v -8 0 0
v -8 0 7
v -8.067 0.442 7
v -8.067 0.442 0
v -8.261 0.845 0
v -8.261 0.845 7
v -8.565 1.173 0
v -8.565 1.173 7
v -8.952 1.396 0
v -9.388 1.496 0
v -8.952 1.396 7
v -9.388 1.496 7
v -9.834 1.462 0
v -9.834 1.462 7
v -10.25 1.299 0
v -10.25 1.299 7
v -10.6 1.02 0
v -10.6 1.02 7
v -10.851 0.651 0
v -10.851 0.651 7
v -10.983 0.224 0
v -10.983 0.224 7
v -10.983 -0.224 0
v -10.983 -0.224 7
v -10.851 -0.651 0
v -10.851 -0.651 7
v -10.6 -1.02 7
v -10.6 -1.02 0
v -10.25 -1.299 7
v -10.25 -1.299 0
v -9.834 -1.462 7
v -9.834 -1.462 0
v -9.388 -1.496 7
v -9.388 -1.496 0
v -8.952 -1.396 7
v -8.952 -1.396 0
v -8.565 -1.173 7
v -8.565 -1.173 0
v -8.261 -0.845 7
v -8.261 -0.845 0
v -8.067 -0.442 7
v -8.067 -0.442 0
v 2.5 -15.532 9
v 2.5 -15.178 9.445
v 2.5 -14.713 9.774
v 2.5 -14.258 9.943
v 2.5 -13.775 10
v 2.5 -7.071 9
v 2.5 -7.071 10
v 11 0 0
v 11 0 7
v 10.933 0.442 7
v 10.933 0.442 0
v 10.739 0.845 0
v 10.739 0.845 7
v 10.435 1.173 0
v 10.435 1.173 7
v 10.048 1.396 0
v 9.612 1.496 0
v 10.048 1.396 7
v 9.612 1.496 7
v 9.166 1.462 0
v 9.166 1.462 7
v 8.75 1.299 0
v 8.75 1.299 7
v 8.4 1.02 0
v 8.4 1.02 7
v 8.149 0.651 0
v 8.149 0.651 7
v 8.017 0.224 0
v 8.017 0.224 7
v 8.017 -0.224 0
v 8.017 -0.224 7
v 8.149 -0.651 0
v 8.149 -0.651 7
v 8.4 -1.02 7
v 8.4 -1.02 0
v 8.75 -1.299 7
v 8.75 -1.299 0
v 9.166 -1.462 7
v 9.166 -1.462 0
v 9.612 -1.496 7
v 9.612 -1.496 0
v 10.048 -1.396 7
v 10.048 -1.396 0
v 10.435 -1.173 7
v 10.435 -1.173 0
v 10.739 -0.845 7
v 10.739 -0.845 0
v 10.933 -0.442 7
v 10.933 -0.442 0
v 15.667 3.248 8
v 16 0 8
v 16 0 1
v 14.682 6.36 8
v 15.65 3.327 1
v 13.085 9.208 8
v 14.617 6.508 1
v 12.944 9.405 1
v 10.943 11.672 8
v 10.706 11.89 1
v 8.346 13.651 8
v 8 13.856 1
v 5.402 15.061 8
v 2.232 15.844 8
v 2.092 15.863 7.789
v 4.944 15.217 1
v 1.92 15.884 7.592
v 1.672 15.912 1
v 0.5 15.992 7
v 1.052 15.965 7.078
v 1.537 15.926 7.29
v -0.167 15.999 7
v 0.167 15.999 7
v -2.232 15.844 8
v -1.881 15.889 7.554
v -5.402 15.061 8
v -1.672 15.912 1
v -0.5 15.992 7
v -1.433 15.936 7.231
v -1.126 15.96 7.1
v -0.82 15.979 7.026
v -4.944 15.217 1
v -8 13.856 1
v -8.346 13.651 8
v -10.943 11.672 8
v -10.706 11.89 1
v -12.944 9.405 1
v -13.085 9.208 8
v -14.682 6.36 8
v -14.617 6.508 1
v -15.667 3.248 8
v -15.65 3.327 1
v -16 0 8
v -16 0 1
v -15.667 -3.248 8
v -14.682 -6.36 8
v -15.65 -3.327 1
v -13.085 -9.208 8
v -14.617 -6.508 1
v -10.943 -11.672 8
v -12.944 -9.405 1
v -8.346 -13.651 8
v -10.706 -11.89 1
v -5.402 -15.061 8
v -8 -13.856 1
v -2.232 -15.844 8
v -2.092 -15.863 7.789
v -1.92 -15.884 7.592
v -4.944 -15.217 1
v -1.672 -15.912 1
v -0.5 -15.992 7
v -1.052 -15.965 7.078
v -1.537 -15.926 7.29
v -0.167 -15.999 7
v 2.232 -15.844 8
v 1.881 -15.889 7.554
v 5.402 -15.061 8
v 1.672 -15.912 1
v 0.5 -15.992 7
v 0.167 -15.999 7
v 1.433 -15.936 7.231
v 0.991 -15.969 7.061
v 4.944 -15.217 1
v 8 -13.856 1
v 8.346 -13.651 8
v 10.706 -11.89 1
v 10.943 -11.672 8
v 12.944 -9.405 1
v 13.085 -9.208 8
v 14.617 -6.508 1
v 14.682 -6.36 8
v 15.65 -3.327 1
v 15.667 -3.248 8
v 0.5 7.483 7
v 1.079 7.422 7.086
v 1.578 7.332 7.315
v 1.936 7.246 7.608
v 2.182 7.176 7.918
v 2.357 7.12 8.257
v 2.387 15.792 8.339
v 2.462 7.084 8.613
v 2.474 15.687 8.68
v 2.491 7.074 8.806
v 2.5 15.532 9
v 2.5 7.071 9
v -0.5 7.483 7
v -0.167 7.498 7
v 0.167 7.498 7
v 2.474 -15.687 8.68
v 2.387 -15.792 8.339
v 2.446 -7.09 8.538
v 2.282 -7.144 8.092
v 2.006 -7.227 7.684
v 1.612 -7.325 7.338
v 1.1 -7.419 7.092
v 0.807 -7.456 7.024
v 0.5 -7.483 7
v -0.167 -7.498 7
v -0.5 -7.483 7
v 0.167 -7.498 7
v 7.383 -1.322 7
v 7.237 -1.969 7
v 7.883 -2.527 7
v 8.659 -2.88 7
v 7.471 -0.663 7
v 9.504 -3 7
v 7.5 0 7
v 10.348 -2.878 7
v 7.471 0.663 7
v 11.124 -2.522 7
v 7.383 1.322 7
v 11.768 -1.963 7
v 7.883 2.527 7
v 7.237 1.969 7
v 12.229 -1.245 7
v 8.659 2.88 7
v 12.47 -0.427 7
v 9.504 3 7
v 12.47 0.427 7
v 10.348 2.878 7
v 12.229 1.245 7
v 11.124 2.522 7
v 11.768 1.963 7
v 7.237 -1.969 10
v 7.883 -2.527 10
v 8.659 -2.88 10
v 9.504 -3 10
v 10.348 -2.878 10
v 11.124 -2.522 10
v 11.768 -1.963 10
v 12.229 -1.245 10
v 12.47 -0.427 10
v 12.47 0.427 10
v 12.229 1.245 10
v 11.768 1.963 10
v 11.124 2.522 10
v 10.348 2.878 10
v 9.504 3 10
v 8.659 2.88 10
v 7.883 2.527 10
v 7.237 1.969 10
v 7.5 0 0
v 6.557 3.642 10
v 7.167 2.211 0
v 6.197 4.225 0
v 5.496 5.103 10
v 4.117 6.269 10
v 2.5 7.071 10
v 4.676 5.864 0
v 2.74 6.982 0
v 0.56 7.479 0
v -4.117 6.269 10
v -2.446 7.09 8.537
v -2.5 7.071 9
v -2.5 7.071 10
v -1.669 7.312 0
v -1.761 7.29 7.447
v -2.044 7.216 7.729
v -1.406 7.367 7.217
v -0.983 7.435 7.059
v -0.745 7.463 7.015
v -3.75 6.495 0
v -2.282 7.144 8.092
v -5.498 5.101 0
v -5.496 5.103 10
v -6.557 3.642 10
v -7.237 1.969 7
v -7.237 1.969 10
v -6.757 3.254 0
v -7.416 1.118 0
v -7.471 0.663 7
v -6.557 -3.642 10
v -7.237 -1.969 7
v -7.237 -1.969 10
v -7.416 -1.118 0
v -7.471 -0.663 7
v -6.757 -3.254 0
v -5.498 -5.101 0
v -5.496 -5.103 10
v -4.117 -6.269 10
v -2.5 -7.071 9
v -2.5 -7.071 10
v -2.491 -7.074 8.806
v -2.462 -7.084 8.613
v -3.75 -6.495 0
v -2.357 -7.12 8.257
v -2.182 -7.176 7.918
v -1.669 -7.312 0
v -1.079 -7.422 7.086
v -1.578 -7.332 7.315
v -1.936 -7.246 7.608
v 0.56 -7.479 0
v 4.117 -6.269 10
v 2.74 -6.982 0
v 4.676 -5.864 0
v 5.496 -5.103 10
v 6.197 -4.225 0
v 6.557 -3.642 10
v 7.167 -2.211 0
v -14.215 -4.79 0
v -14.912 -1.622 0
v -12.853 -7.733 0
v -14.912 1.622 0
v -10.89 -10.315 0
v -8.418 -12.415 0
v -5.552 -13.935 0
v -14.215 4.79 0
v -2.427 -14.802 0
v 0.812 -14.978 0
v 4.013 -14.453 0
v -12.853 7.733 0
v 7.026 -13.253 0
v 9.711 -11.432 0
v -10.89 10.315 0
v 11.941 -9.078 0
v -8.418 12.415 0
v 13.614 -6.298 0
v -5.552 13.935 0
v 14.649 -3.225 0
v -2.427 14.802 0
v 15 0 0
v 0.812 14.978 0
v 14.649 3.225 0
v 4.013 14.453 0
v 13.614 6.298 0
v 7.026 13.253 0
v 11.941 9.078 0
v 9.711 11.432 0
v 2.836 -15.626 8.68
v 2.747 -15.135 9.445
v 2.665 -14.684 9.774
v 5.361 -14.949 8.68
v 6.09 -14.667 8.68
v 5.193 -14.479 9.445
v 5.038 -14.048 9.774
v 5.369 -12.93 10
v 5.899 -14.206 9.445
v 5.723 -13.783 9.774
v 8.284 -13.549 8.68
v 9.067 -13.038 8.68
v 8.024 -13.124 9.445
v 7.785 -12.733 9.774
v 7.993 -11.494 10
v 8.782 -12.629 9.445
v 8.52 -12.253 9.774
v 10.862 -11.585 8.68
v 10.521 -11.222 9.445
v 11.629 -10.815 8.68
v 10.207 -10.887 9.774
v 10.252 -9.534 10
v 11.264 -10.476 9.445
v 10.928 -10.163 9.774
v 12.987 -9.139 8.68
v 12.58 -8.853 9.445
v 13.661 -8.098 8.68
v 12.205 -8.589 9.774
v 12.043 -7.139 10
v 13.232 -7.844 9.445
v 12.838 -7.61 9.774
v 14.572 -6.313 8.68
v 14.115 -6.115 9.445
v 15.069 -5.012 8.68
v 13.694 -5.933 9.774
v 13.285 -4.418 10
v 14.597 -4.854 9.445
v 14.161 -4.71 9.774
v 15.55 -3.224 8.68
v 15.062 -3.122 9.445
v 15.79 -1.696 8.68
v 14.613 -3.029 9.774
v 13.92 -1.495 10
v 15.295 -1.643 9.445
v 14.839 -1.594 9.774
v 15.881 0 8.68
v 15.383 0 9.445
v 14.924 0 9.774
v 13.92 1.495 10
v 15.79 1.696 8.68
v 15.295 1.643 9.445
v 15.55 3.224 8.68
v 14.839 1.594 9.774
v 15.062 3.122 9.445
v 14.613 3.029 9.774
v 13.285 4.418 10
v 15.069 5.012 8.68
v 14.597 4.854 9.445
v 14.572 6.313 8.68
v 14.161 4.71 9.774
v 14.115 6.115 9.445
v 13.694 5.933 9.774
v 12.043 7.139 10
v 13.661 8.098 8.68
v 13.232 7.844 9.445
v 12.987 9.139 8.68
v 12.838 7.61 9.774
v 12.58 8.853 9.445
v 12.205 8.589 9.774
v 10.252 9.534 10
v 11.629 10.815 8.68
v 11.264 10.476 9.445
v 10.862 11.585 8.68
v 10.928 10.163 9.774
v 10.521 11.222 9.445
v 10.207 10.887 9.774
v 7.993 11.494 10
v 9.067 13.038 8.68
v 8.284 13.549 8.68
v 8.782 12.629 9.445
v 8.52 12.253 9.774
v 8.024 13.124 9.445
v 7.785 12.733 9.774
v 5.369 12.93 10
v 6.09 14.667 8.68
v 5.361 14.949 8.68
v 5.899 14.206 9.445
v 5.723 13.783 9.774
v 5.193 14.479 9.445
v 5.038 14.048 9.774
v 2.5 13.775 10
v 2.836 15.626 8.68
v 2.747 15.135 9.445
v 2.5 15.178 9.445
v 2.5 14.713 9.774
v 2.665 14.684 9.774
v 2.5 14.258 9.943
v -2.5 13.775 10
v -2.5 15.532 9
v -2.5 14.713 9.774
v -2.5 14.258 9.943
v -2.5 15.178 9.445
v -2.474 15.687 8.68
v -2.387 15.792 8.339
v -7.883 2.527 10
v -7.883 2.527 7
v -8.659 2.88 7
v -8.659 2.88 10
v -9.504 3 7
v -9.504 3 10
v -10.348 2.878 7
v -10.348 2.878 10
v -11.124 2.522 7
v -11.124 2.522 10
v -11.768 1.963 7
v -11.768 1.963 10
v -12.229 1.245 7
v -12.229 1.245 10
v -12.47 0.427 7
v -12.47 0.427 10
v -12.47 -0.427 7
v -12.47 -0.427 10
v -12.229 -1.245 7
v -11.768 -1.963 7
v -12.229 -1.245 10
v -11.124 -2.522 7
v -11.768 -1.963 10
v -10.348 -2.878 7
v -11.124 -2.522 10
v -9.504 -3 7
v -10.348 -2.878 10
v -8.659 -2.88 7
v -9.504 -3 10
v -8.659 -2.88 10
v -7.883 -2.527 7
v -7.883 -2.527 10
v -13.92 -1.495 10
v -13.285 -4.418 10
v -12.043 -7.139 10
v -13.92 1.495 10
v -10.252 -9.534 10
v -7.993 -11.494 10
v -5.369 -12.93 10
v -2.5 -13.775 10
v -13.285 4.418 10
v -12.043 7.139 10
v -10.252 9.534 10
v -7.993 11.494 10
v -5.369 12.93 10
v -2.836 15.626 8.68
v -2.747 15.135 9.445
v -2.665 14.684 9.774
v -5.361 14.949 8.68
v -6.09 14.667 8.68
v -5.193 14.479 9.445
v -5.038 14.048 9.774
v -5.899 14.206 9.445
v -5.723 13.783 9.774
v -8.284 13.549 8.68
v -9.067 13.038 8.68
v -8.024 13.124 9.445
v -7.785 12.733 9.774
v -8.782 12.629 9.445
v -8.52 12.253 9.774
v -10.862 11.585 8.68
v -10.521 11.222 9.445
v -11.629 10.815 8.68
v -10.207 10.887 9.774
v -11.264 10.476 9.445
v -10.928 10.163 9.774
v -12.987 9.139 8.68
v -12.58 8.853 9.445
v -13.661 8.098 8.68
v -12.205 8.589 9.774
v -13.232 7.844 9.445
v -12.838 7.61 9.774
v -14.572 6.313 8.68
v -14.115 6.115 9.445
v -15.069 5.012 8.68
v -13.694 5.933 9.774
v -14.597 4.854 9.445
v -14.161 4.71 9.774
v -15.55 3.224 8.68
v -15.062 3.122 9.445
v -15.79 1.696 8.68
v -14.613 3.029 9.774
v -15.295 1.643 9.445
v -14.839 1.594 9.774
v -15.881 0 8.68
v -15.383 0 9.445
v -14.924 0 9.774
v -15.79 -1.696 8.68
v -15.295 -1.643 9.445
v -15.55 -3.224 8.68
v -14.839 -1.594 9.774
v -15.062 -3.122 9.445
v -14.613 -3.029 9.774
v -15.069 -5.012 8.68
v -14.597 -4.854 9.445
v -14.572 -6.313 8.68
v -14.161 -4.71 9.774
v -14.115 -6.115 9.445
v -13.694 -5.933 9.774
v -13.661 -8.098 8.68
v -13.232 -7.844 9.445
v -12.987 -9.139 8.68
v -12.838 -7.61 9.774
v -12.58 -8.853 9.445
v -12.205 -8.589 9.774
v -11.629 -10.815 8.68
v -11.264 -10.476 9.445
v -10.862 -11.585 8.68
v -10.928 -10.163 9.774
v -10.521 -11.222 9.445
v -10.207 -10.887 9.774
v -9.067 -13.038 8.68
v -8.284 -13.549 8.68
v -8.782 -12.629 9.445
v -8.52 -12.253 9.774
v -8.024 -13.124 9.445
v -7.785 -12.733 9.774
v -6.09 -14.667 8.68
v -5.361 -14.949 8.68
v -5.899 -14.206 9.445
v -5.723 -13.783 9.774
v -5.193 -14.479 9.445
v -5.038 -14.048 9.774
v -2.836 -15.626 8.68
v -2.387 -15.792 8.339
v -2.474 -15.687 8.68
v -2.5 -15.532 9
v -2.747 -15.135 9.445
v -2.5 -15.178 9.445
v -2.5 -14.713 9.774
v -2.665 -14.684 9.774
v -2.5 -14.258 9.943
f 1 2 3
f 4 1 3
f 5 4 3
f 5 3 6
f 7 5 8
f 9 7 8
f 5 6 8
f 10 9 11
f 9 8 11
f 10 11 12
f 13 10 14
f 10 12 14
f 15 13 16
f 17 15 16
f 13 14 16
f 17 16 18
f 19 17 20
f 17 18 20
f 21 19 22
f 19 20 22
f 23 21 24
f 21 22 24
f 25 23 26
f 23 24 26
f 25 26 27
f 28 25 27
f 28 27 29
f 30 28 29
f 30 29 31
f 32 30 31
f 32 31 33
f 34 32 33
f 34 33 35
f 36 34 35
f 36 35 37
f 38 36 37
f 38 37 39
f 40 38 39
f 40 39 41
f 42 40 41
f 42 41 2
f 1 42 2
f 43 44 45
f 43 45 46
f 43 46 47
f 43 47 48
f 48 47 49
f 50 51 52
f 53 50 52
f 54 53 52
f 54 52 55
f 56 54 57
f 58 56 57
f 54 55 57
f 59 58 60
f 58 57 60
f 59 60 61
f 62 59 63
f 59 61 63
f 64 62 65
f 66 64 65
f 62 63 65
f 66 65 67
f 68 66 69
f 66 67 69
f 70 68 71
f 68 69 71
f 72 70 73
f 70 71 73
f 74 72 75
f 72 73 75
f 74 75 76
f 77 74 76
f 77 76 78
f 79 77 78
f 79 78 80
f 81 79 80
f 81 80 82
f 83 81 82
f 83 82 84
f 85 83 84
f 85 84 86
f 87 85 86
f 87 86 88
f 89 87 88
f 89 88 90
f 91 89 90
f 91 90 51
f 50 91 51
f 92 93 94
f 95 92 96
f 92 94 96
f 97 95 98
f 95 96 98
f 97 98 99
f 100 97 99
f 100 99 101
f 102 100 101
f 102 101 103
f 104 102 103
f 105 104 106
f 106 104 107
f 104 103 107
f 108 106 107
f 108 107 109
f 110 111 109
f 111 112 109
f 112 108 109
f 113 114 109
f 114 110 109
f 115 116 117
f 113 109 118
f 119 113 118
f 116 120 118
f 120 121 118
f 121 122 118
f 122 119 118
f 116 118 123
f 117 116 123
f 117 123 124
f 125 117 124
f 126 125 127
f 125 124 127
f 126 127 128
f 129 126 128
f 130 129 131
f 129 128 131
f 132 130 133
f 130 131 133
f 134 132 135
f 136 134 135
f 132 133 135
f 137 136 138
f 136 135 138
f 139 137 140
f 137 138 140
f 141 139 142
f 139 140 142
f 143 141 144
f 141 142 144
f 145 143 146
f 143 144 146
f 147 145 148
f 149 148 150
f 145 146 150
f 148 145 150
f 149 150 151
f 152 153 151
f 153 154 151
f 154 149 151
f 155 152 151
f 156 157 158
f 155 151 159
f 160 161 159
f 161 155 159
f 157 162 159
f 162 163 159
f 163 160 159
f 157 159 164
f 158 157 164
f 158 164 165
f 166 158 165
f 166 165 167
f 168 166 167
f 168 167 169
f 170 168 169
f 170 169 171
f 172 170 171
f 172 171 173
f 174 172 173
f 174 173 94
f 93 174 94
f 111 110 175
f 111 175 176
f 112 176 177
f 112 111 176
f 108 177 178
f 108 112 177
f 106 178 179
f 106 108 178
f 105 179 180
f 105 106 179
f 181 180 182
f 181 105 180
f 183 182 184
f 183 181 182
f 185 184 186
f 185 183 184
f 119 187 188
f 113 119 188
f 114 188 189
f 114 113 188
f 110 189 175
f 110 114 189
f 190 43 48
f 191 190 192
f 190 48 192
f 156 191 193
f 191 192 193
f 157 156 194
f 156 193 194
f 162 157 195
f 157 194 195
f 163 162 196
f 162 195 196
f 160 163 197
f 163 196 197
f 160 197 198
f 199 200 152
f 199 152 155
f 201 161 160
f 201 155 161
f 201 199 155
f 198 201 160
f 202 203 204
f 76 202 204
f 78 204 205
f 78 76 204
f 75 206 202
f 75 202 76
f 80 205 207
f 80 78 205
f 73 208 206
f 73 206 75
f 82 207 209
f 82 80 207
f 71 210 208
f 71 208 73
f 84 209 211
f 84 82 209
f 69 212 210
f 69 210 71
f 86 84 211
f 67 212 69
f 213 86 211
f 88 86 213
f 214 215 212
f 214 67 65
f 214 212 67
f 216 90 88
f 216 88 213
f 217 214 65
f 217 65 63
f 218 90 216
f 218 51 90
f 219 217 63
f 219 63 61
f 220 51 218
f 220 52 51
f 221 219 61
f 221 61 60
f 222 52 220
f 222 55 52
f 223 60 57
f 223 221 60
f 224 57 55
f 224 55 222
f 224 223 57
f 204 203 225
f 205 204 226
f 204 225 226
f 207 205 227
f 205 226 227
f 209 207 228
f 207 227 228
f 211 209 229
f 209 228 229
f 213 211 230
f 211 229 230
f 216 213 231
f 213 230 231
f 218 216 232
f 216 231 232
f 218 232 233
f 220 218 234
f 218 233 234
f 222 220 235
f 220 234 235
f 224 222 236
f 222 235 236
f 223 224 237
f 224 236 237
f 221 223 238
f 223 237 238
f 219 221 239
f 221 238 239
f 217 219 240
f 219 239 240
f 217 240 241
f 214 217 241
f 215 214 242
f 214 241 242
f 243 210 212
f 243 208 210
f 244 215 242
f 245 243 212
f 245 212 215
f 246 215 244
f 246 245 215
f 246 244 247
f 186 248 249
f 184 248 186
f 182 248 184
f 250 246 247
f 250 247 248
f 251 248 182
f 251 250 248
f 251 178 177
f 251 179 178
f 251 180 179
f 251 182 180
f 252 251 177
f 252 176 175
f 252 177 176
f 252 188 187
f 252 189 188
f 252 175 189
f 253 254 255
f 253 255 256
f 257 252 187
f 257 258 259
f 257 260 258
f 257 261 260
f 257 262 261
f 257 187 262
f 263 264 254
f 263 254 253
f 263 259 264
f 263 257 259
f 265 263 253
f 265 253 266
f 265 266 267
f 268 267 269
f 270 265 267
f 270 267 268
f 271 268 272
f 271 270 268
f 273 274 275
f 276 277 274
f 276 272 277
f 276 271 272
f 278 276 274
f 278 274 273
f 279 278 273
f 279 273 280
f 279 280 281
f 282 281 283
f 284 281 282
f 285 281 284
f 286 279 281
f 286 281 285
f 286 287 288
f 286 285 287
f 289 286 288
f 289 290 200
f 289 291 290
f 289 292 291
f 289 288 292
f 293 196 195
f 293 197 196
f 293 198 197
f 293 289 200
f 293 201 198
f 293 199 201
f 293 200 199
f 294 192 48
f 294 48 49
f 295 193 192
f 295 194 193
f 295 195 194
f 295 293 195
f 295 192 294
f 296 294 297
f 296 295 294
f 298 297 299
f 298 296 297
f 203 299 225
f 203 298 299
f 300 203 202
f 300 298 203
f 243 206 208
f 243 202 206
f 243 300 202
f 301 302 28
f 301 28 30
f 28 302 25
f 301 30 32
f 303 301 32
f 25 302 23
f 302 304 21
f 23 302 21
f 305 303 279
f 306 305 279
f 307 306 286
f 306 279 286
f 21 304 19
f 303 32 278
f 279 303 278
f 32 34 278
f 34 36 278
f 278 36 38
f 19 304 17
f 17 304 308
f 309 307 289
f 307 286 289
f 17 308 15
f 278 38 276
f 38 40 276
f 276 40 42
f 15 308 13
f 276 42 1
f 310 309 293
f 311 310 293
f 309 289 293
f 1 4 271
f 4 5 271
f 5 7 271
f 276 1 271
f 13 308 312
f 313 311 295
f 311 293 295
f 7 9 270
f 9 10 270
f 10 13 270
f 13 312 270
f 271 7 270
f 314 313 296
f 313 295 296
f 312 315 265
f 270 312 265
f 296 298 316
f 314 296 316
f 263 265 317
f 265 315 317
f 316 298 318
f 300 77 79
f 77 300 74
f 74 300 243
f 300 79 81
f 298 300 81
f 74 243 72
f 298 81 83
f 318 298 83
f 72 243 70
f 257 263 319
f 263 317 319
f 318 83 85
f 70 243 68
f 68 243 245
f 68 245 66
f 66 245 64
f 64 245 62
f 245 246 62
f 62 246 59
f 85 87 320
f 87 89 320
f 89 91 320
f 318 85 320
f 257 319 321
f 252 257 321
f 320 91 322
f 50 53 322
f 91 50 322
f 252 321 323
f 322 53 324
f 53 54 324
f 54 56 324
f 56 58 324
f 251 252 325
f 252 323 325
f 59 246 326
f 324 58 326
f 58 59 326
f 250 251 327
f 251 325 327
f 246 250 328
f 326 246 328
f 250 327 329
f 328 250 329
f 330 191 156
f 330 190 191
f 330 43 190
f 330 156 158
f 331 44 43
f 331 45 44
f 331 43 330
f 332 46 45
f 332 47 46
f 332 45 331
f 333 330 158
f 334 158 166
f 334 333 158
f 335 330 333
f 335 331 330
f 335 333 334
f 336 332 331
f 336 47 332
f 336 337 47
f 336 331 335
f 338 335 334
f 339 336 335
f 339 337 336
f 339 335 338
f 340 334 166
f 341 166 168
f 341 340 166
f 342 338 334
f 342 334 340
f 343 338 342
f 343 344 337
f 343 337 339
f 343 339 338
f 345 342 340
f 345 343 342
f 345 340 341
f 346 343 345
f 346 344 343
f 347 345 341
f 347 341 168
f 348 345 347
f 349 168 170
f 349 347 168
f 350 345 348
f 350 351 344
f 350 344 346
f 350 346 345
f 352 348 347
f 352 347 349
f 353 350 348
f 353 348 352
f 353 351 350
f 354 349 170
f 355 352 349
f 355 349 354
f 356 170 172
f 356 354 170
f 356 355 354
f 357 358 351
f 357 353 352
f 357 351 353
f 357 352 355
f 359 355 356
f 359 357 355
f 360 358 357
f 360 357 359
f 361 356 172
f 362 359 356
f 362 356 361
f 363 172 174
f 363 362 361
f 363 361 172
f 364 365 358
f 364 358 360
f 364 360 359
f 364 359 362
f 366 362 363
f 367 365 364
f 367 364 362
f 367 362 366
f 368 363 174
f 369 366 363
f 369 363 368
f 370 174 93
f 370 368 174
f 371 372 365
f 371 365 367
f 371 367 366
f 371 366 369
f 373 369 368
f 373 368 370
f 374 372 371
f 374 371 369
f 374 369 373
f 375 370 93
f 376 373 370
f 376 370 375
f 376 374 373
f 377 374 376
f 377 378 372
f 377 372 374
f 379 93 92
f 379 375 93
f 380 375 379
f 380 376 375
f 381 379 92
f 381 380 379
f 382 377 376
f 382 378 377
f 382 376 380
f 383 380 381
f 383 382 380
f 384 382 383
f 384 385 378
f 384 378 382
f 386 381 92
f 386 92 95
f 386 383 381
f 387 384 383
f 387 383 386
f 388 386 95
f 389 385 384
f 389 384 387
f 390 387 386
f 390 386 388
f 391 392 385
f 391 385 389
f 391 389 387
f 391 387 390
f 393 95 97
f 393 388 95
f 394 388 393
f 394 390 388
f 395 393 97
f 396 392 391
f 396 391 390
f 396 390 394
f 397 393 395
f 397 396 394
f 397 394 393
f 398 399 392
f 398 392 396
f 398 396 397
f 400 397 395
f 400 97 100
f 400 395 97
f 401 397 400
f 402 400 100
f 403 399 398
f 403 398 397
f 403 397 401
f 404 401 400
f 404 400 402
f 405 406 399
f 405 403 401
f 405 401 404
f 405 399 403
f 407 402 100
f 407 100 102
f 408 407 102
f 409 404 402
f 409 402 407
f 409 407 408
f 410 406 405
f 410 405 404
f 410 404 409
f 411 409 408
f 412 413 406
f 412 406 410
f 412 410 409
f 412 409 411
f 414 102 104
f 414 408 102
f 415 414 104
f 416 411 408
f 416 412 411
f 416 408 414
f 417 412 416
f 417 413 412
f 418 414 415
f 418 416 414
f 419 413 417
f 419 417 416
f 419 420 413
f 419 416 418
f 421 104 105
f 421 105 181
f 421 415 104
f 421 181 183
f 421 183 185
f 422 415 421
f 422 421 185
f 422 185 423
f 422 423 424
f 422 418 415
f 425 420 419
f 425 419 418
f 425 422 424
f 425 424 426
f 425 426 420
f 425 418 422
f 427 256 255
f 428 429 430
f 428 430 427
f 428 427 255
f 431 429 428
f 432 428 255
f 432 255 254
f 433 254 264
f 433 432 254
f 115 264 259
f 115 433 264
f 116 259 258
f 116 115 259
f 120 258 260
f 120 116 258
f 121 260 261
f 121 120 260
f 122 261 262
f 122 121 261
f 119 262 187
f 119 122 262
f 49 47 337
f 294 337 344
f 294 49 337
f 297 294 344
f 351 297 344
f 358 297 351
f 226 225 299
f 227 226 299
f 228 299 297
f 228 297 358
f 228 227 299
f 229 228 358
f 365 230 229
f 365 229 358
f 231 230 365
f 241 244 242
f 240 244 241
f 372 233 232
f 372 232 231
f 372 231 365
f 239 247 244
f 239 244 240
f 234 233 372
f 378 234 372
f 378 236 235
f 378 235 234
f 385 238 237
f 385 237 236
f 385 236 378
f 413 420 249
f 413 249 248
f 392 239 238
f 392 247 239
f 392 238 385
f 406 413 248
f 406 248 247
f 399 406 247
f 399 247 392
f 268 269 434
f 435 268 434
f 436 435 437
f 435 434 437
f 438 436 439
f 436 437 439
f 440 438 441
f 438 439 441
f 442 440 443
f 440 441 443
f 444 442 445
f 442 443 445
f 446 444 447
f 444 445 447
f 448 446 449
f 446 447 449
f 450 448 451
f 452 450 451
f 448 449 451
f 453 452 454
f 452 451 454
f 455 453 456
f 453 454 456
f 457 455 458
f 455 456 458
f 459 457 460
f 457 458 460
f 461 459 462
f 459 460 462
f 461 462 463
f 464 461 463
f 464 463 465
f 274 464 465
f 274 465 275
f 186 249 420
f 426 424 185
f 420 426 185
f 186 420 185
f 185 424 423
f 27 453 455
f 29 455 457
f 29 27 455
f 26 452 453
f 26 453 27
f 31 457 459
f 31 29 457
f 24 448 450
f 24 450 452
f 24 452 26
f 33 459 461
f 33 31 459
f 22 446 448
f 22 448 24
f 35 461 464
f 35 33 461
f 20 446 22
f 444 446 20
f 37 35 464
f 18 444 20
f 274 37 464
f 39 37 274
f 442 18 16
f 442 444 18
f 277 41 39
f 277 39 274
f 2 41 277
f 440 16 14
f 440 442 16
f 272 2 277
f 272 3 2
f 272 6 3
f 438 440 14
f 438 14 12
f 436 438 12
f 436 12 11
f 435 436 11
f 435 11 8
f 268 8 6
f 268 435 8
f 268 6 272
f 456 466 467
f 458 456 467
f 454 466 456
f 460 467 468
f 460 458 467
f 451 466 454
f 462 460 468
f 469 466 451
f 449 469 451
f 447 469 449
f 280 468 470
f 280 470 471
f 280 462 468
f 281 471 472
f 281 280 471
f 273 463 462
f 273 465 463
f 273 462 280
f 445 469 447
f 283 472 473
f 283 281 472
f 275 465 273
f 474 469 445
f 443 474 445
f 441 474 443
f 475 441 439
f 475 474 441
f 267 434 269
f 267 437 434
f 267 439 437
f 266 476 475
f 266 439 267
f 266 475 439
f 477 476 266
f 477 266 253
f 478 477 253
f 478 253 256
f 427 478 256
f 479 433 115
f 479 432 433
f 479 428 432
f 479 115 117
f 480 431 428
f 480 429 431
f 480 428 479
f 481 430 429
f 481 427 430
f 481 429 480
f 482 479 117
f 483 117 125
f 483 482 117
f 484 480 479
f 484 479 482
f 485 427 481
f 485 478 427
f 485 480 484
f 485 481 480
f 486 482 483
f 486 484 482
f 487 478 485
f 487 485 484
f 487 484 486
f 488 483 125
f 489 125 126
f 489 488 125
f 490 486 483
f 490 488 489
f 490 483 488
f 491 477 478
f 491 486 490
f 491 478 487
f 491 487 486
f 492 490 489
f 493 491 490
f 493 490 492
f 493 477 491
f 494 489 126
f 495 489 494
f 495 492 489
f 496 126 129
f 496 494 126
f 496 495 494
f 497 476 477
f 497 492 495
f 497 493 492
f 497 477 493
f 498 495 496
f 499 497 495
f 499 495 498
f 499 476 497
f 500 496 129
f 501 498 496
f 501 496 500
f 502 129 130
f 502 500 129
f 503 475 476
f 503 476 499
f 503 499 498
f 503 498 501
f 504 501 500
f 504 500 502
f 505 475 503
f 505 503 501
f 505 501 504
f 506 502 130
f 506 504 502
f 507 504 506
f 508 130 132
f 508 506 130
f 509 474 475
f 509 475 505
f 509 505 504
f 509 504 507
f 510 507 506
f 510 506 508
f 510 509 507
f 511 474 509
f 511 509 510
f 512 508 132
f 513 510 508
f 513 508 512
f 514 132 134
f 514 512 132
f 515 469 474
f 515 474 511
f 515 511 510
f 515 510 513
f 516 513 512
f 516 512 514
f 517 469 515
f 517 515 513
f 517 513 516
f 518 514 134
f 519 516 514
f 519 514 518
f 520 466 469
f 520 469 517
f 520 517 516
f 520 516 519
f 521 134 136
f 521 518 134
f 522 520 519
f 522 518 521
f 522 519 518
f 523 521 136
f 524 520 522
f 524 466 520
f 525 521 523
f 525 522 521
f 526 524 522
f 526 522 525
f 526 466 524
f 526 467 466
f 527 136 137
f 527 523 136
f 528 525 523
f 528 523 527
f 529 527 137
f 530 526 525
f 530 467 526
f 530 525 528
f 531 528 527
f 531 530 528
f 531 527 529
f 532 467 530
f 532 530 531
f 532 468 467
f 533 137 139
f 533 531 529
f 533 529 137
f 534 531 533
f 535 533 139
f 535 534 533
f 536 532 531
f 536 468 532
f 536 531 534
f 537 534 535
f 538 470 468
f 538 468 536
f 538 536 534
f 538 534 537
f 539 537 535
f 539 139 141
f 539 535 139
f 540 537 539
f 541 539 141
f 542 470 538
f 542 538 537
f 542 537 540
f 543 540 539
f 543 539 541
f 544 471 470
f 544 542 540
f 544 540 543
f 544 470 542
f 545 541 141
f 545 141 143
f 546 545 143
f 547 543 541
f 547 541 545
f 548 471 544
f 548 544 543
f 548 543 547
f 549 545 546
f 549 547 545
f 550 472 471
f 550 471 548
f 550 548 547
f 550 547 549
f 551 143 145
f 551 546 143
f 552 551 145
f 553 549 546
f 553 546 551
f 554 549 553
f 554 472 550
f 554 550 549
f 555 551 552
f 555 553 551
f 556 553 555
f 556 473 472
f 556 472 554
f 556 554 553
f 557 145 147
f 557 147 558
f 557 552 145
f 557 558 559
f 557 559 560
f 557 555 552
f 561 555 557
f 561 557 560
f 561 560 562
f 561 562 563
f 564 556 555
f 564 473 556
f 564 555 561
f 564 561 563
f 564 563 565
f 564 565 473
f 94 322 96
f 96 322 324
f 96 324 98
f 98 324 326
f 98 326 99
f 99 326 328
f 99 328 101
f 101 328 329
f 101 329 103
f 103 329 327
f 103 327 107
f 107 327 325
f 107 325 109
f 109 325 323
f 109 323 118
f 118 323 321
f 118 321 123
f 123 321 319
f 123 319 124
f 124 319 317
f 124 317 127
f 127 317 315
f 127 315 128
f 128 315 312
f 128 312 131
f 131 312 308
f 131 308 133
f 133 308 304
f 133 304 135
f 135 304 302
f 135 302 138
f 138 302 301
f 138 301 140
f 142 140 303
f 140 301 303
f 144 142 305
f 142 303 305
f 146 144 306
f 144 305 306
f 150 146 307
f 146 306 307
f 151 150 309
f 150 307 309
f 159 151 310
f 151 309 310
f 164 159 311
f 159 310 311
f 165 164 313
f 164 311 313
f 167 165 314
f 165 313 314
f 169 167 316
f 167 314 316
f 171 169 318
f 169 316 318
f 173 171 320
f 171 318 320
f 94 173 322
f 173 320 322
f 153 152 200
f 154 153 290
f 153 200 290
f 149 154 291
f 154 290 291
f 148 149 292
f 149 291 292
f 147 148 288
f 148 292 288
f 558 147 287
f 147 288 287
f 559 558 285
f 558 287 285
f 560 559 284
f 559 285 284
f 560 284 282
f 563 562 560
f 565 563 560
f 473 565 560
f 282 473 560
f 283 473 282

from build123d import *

# Parameters (mm, degrees)
SKETCH_R        = 16
SKETCH_R_2      = 7.5
PAD_DEPTH       = 10
SKETCH001_R     = 1.5
POCKET_DEPTH    = 10.001
SKETCH002_W     = 5
SKETCH002_H     = 40
POCKET001_DEPTH = 3
FILLET_R        = 2
FILLET001_R     = 2
CHAMFER_SIZE    = 1
SKETCH003_R     = 3
POCKET002_DEPTH = 3


with BuildPart() as part:
    # Sketch → Pad (new body)
    with BuildSketch(Plane.XY):
        Circle(SKETCH_R)
        Circle(SKETCH_R_2, mode=Mode.SUBTRACT)
    extrude(amount=PAD_DEPTH)

    # Sketch001 (on Face4 of Pad) → Pocket (cut, through all)
    with BuildSketch(Plane.XY.offset(10)):
        with Locations((9.5, 0)):
            Circle(SKETCH001_R)
        with Locations((-9.5, 0)):
            Circle(SKETCH001_R)
    extrude(amount=-POCKET_DEPTH, mode=Mode.SUBTRACT)

    # Sketch002 (on Face3 of Pocket) → Pocket001 (cut)
    with BuildSketch(Plane.XY.offset(10)):
        Rectangle(SKETCH002_W, SKETCH002_H)
    extrude(amount=-POCKET001_DEPTH, mode=Mode.SUBTRACT)

    # Fillet
    fillet_edges = [part.edges().sort_by_distance(p)[0] for p in [
        (-2.5, 11.437274, 7),
        (2.5, 11.437274, 7),
        (2.5, -11.437274, 7),
        (-2.5, -11.437274, 7),
    ]]
    fillet(fillet_edges, radius=FILLET_R)

    # Fillet001
    fillet001_edges = [part.edges().sort_by_distance(p)[0] for p in [
        (12.165525, -10.392305, 10),
        (12.165525, 10.392305, 10),
        (-16, 0, 10),
    ]]
    fillet(fillet001_edges, radius=FILLET001_R)

    # Chamfer
    chamfer_edges = [part.edges().sort_by_distance(p)[0] for p in [
        (-16, 0, 0),
    ]]
    chamfer(chamfer_edges, length=CHAMFER_SIZE)

    # Sketch003 (on Face19 of Chamfer) → Pocket002 (cut)
    with BuildSketch(Plane.XY.offset(10)):
        with Locations((-9.5, 0)):
            Circle(SKETCH003_R)
        with Locations((9.5, 0)):
            Circle(SKETCH003_R)
    extrude(amount=-POCKET002_DEPTH, mode=Mode.SUBTRACT)


solid = part.part
